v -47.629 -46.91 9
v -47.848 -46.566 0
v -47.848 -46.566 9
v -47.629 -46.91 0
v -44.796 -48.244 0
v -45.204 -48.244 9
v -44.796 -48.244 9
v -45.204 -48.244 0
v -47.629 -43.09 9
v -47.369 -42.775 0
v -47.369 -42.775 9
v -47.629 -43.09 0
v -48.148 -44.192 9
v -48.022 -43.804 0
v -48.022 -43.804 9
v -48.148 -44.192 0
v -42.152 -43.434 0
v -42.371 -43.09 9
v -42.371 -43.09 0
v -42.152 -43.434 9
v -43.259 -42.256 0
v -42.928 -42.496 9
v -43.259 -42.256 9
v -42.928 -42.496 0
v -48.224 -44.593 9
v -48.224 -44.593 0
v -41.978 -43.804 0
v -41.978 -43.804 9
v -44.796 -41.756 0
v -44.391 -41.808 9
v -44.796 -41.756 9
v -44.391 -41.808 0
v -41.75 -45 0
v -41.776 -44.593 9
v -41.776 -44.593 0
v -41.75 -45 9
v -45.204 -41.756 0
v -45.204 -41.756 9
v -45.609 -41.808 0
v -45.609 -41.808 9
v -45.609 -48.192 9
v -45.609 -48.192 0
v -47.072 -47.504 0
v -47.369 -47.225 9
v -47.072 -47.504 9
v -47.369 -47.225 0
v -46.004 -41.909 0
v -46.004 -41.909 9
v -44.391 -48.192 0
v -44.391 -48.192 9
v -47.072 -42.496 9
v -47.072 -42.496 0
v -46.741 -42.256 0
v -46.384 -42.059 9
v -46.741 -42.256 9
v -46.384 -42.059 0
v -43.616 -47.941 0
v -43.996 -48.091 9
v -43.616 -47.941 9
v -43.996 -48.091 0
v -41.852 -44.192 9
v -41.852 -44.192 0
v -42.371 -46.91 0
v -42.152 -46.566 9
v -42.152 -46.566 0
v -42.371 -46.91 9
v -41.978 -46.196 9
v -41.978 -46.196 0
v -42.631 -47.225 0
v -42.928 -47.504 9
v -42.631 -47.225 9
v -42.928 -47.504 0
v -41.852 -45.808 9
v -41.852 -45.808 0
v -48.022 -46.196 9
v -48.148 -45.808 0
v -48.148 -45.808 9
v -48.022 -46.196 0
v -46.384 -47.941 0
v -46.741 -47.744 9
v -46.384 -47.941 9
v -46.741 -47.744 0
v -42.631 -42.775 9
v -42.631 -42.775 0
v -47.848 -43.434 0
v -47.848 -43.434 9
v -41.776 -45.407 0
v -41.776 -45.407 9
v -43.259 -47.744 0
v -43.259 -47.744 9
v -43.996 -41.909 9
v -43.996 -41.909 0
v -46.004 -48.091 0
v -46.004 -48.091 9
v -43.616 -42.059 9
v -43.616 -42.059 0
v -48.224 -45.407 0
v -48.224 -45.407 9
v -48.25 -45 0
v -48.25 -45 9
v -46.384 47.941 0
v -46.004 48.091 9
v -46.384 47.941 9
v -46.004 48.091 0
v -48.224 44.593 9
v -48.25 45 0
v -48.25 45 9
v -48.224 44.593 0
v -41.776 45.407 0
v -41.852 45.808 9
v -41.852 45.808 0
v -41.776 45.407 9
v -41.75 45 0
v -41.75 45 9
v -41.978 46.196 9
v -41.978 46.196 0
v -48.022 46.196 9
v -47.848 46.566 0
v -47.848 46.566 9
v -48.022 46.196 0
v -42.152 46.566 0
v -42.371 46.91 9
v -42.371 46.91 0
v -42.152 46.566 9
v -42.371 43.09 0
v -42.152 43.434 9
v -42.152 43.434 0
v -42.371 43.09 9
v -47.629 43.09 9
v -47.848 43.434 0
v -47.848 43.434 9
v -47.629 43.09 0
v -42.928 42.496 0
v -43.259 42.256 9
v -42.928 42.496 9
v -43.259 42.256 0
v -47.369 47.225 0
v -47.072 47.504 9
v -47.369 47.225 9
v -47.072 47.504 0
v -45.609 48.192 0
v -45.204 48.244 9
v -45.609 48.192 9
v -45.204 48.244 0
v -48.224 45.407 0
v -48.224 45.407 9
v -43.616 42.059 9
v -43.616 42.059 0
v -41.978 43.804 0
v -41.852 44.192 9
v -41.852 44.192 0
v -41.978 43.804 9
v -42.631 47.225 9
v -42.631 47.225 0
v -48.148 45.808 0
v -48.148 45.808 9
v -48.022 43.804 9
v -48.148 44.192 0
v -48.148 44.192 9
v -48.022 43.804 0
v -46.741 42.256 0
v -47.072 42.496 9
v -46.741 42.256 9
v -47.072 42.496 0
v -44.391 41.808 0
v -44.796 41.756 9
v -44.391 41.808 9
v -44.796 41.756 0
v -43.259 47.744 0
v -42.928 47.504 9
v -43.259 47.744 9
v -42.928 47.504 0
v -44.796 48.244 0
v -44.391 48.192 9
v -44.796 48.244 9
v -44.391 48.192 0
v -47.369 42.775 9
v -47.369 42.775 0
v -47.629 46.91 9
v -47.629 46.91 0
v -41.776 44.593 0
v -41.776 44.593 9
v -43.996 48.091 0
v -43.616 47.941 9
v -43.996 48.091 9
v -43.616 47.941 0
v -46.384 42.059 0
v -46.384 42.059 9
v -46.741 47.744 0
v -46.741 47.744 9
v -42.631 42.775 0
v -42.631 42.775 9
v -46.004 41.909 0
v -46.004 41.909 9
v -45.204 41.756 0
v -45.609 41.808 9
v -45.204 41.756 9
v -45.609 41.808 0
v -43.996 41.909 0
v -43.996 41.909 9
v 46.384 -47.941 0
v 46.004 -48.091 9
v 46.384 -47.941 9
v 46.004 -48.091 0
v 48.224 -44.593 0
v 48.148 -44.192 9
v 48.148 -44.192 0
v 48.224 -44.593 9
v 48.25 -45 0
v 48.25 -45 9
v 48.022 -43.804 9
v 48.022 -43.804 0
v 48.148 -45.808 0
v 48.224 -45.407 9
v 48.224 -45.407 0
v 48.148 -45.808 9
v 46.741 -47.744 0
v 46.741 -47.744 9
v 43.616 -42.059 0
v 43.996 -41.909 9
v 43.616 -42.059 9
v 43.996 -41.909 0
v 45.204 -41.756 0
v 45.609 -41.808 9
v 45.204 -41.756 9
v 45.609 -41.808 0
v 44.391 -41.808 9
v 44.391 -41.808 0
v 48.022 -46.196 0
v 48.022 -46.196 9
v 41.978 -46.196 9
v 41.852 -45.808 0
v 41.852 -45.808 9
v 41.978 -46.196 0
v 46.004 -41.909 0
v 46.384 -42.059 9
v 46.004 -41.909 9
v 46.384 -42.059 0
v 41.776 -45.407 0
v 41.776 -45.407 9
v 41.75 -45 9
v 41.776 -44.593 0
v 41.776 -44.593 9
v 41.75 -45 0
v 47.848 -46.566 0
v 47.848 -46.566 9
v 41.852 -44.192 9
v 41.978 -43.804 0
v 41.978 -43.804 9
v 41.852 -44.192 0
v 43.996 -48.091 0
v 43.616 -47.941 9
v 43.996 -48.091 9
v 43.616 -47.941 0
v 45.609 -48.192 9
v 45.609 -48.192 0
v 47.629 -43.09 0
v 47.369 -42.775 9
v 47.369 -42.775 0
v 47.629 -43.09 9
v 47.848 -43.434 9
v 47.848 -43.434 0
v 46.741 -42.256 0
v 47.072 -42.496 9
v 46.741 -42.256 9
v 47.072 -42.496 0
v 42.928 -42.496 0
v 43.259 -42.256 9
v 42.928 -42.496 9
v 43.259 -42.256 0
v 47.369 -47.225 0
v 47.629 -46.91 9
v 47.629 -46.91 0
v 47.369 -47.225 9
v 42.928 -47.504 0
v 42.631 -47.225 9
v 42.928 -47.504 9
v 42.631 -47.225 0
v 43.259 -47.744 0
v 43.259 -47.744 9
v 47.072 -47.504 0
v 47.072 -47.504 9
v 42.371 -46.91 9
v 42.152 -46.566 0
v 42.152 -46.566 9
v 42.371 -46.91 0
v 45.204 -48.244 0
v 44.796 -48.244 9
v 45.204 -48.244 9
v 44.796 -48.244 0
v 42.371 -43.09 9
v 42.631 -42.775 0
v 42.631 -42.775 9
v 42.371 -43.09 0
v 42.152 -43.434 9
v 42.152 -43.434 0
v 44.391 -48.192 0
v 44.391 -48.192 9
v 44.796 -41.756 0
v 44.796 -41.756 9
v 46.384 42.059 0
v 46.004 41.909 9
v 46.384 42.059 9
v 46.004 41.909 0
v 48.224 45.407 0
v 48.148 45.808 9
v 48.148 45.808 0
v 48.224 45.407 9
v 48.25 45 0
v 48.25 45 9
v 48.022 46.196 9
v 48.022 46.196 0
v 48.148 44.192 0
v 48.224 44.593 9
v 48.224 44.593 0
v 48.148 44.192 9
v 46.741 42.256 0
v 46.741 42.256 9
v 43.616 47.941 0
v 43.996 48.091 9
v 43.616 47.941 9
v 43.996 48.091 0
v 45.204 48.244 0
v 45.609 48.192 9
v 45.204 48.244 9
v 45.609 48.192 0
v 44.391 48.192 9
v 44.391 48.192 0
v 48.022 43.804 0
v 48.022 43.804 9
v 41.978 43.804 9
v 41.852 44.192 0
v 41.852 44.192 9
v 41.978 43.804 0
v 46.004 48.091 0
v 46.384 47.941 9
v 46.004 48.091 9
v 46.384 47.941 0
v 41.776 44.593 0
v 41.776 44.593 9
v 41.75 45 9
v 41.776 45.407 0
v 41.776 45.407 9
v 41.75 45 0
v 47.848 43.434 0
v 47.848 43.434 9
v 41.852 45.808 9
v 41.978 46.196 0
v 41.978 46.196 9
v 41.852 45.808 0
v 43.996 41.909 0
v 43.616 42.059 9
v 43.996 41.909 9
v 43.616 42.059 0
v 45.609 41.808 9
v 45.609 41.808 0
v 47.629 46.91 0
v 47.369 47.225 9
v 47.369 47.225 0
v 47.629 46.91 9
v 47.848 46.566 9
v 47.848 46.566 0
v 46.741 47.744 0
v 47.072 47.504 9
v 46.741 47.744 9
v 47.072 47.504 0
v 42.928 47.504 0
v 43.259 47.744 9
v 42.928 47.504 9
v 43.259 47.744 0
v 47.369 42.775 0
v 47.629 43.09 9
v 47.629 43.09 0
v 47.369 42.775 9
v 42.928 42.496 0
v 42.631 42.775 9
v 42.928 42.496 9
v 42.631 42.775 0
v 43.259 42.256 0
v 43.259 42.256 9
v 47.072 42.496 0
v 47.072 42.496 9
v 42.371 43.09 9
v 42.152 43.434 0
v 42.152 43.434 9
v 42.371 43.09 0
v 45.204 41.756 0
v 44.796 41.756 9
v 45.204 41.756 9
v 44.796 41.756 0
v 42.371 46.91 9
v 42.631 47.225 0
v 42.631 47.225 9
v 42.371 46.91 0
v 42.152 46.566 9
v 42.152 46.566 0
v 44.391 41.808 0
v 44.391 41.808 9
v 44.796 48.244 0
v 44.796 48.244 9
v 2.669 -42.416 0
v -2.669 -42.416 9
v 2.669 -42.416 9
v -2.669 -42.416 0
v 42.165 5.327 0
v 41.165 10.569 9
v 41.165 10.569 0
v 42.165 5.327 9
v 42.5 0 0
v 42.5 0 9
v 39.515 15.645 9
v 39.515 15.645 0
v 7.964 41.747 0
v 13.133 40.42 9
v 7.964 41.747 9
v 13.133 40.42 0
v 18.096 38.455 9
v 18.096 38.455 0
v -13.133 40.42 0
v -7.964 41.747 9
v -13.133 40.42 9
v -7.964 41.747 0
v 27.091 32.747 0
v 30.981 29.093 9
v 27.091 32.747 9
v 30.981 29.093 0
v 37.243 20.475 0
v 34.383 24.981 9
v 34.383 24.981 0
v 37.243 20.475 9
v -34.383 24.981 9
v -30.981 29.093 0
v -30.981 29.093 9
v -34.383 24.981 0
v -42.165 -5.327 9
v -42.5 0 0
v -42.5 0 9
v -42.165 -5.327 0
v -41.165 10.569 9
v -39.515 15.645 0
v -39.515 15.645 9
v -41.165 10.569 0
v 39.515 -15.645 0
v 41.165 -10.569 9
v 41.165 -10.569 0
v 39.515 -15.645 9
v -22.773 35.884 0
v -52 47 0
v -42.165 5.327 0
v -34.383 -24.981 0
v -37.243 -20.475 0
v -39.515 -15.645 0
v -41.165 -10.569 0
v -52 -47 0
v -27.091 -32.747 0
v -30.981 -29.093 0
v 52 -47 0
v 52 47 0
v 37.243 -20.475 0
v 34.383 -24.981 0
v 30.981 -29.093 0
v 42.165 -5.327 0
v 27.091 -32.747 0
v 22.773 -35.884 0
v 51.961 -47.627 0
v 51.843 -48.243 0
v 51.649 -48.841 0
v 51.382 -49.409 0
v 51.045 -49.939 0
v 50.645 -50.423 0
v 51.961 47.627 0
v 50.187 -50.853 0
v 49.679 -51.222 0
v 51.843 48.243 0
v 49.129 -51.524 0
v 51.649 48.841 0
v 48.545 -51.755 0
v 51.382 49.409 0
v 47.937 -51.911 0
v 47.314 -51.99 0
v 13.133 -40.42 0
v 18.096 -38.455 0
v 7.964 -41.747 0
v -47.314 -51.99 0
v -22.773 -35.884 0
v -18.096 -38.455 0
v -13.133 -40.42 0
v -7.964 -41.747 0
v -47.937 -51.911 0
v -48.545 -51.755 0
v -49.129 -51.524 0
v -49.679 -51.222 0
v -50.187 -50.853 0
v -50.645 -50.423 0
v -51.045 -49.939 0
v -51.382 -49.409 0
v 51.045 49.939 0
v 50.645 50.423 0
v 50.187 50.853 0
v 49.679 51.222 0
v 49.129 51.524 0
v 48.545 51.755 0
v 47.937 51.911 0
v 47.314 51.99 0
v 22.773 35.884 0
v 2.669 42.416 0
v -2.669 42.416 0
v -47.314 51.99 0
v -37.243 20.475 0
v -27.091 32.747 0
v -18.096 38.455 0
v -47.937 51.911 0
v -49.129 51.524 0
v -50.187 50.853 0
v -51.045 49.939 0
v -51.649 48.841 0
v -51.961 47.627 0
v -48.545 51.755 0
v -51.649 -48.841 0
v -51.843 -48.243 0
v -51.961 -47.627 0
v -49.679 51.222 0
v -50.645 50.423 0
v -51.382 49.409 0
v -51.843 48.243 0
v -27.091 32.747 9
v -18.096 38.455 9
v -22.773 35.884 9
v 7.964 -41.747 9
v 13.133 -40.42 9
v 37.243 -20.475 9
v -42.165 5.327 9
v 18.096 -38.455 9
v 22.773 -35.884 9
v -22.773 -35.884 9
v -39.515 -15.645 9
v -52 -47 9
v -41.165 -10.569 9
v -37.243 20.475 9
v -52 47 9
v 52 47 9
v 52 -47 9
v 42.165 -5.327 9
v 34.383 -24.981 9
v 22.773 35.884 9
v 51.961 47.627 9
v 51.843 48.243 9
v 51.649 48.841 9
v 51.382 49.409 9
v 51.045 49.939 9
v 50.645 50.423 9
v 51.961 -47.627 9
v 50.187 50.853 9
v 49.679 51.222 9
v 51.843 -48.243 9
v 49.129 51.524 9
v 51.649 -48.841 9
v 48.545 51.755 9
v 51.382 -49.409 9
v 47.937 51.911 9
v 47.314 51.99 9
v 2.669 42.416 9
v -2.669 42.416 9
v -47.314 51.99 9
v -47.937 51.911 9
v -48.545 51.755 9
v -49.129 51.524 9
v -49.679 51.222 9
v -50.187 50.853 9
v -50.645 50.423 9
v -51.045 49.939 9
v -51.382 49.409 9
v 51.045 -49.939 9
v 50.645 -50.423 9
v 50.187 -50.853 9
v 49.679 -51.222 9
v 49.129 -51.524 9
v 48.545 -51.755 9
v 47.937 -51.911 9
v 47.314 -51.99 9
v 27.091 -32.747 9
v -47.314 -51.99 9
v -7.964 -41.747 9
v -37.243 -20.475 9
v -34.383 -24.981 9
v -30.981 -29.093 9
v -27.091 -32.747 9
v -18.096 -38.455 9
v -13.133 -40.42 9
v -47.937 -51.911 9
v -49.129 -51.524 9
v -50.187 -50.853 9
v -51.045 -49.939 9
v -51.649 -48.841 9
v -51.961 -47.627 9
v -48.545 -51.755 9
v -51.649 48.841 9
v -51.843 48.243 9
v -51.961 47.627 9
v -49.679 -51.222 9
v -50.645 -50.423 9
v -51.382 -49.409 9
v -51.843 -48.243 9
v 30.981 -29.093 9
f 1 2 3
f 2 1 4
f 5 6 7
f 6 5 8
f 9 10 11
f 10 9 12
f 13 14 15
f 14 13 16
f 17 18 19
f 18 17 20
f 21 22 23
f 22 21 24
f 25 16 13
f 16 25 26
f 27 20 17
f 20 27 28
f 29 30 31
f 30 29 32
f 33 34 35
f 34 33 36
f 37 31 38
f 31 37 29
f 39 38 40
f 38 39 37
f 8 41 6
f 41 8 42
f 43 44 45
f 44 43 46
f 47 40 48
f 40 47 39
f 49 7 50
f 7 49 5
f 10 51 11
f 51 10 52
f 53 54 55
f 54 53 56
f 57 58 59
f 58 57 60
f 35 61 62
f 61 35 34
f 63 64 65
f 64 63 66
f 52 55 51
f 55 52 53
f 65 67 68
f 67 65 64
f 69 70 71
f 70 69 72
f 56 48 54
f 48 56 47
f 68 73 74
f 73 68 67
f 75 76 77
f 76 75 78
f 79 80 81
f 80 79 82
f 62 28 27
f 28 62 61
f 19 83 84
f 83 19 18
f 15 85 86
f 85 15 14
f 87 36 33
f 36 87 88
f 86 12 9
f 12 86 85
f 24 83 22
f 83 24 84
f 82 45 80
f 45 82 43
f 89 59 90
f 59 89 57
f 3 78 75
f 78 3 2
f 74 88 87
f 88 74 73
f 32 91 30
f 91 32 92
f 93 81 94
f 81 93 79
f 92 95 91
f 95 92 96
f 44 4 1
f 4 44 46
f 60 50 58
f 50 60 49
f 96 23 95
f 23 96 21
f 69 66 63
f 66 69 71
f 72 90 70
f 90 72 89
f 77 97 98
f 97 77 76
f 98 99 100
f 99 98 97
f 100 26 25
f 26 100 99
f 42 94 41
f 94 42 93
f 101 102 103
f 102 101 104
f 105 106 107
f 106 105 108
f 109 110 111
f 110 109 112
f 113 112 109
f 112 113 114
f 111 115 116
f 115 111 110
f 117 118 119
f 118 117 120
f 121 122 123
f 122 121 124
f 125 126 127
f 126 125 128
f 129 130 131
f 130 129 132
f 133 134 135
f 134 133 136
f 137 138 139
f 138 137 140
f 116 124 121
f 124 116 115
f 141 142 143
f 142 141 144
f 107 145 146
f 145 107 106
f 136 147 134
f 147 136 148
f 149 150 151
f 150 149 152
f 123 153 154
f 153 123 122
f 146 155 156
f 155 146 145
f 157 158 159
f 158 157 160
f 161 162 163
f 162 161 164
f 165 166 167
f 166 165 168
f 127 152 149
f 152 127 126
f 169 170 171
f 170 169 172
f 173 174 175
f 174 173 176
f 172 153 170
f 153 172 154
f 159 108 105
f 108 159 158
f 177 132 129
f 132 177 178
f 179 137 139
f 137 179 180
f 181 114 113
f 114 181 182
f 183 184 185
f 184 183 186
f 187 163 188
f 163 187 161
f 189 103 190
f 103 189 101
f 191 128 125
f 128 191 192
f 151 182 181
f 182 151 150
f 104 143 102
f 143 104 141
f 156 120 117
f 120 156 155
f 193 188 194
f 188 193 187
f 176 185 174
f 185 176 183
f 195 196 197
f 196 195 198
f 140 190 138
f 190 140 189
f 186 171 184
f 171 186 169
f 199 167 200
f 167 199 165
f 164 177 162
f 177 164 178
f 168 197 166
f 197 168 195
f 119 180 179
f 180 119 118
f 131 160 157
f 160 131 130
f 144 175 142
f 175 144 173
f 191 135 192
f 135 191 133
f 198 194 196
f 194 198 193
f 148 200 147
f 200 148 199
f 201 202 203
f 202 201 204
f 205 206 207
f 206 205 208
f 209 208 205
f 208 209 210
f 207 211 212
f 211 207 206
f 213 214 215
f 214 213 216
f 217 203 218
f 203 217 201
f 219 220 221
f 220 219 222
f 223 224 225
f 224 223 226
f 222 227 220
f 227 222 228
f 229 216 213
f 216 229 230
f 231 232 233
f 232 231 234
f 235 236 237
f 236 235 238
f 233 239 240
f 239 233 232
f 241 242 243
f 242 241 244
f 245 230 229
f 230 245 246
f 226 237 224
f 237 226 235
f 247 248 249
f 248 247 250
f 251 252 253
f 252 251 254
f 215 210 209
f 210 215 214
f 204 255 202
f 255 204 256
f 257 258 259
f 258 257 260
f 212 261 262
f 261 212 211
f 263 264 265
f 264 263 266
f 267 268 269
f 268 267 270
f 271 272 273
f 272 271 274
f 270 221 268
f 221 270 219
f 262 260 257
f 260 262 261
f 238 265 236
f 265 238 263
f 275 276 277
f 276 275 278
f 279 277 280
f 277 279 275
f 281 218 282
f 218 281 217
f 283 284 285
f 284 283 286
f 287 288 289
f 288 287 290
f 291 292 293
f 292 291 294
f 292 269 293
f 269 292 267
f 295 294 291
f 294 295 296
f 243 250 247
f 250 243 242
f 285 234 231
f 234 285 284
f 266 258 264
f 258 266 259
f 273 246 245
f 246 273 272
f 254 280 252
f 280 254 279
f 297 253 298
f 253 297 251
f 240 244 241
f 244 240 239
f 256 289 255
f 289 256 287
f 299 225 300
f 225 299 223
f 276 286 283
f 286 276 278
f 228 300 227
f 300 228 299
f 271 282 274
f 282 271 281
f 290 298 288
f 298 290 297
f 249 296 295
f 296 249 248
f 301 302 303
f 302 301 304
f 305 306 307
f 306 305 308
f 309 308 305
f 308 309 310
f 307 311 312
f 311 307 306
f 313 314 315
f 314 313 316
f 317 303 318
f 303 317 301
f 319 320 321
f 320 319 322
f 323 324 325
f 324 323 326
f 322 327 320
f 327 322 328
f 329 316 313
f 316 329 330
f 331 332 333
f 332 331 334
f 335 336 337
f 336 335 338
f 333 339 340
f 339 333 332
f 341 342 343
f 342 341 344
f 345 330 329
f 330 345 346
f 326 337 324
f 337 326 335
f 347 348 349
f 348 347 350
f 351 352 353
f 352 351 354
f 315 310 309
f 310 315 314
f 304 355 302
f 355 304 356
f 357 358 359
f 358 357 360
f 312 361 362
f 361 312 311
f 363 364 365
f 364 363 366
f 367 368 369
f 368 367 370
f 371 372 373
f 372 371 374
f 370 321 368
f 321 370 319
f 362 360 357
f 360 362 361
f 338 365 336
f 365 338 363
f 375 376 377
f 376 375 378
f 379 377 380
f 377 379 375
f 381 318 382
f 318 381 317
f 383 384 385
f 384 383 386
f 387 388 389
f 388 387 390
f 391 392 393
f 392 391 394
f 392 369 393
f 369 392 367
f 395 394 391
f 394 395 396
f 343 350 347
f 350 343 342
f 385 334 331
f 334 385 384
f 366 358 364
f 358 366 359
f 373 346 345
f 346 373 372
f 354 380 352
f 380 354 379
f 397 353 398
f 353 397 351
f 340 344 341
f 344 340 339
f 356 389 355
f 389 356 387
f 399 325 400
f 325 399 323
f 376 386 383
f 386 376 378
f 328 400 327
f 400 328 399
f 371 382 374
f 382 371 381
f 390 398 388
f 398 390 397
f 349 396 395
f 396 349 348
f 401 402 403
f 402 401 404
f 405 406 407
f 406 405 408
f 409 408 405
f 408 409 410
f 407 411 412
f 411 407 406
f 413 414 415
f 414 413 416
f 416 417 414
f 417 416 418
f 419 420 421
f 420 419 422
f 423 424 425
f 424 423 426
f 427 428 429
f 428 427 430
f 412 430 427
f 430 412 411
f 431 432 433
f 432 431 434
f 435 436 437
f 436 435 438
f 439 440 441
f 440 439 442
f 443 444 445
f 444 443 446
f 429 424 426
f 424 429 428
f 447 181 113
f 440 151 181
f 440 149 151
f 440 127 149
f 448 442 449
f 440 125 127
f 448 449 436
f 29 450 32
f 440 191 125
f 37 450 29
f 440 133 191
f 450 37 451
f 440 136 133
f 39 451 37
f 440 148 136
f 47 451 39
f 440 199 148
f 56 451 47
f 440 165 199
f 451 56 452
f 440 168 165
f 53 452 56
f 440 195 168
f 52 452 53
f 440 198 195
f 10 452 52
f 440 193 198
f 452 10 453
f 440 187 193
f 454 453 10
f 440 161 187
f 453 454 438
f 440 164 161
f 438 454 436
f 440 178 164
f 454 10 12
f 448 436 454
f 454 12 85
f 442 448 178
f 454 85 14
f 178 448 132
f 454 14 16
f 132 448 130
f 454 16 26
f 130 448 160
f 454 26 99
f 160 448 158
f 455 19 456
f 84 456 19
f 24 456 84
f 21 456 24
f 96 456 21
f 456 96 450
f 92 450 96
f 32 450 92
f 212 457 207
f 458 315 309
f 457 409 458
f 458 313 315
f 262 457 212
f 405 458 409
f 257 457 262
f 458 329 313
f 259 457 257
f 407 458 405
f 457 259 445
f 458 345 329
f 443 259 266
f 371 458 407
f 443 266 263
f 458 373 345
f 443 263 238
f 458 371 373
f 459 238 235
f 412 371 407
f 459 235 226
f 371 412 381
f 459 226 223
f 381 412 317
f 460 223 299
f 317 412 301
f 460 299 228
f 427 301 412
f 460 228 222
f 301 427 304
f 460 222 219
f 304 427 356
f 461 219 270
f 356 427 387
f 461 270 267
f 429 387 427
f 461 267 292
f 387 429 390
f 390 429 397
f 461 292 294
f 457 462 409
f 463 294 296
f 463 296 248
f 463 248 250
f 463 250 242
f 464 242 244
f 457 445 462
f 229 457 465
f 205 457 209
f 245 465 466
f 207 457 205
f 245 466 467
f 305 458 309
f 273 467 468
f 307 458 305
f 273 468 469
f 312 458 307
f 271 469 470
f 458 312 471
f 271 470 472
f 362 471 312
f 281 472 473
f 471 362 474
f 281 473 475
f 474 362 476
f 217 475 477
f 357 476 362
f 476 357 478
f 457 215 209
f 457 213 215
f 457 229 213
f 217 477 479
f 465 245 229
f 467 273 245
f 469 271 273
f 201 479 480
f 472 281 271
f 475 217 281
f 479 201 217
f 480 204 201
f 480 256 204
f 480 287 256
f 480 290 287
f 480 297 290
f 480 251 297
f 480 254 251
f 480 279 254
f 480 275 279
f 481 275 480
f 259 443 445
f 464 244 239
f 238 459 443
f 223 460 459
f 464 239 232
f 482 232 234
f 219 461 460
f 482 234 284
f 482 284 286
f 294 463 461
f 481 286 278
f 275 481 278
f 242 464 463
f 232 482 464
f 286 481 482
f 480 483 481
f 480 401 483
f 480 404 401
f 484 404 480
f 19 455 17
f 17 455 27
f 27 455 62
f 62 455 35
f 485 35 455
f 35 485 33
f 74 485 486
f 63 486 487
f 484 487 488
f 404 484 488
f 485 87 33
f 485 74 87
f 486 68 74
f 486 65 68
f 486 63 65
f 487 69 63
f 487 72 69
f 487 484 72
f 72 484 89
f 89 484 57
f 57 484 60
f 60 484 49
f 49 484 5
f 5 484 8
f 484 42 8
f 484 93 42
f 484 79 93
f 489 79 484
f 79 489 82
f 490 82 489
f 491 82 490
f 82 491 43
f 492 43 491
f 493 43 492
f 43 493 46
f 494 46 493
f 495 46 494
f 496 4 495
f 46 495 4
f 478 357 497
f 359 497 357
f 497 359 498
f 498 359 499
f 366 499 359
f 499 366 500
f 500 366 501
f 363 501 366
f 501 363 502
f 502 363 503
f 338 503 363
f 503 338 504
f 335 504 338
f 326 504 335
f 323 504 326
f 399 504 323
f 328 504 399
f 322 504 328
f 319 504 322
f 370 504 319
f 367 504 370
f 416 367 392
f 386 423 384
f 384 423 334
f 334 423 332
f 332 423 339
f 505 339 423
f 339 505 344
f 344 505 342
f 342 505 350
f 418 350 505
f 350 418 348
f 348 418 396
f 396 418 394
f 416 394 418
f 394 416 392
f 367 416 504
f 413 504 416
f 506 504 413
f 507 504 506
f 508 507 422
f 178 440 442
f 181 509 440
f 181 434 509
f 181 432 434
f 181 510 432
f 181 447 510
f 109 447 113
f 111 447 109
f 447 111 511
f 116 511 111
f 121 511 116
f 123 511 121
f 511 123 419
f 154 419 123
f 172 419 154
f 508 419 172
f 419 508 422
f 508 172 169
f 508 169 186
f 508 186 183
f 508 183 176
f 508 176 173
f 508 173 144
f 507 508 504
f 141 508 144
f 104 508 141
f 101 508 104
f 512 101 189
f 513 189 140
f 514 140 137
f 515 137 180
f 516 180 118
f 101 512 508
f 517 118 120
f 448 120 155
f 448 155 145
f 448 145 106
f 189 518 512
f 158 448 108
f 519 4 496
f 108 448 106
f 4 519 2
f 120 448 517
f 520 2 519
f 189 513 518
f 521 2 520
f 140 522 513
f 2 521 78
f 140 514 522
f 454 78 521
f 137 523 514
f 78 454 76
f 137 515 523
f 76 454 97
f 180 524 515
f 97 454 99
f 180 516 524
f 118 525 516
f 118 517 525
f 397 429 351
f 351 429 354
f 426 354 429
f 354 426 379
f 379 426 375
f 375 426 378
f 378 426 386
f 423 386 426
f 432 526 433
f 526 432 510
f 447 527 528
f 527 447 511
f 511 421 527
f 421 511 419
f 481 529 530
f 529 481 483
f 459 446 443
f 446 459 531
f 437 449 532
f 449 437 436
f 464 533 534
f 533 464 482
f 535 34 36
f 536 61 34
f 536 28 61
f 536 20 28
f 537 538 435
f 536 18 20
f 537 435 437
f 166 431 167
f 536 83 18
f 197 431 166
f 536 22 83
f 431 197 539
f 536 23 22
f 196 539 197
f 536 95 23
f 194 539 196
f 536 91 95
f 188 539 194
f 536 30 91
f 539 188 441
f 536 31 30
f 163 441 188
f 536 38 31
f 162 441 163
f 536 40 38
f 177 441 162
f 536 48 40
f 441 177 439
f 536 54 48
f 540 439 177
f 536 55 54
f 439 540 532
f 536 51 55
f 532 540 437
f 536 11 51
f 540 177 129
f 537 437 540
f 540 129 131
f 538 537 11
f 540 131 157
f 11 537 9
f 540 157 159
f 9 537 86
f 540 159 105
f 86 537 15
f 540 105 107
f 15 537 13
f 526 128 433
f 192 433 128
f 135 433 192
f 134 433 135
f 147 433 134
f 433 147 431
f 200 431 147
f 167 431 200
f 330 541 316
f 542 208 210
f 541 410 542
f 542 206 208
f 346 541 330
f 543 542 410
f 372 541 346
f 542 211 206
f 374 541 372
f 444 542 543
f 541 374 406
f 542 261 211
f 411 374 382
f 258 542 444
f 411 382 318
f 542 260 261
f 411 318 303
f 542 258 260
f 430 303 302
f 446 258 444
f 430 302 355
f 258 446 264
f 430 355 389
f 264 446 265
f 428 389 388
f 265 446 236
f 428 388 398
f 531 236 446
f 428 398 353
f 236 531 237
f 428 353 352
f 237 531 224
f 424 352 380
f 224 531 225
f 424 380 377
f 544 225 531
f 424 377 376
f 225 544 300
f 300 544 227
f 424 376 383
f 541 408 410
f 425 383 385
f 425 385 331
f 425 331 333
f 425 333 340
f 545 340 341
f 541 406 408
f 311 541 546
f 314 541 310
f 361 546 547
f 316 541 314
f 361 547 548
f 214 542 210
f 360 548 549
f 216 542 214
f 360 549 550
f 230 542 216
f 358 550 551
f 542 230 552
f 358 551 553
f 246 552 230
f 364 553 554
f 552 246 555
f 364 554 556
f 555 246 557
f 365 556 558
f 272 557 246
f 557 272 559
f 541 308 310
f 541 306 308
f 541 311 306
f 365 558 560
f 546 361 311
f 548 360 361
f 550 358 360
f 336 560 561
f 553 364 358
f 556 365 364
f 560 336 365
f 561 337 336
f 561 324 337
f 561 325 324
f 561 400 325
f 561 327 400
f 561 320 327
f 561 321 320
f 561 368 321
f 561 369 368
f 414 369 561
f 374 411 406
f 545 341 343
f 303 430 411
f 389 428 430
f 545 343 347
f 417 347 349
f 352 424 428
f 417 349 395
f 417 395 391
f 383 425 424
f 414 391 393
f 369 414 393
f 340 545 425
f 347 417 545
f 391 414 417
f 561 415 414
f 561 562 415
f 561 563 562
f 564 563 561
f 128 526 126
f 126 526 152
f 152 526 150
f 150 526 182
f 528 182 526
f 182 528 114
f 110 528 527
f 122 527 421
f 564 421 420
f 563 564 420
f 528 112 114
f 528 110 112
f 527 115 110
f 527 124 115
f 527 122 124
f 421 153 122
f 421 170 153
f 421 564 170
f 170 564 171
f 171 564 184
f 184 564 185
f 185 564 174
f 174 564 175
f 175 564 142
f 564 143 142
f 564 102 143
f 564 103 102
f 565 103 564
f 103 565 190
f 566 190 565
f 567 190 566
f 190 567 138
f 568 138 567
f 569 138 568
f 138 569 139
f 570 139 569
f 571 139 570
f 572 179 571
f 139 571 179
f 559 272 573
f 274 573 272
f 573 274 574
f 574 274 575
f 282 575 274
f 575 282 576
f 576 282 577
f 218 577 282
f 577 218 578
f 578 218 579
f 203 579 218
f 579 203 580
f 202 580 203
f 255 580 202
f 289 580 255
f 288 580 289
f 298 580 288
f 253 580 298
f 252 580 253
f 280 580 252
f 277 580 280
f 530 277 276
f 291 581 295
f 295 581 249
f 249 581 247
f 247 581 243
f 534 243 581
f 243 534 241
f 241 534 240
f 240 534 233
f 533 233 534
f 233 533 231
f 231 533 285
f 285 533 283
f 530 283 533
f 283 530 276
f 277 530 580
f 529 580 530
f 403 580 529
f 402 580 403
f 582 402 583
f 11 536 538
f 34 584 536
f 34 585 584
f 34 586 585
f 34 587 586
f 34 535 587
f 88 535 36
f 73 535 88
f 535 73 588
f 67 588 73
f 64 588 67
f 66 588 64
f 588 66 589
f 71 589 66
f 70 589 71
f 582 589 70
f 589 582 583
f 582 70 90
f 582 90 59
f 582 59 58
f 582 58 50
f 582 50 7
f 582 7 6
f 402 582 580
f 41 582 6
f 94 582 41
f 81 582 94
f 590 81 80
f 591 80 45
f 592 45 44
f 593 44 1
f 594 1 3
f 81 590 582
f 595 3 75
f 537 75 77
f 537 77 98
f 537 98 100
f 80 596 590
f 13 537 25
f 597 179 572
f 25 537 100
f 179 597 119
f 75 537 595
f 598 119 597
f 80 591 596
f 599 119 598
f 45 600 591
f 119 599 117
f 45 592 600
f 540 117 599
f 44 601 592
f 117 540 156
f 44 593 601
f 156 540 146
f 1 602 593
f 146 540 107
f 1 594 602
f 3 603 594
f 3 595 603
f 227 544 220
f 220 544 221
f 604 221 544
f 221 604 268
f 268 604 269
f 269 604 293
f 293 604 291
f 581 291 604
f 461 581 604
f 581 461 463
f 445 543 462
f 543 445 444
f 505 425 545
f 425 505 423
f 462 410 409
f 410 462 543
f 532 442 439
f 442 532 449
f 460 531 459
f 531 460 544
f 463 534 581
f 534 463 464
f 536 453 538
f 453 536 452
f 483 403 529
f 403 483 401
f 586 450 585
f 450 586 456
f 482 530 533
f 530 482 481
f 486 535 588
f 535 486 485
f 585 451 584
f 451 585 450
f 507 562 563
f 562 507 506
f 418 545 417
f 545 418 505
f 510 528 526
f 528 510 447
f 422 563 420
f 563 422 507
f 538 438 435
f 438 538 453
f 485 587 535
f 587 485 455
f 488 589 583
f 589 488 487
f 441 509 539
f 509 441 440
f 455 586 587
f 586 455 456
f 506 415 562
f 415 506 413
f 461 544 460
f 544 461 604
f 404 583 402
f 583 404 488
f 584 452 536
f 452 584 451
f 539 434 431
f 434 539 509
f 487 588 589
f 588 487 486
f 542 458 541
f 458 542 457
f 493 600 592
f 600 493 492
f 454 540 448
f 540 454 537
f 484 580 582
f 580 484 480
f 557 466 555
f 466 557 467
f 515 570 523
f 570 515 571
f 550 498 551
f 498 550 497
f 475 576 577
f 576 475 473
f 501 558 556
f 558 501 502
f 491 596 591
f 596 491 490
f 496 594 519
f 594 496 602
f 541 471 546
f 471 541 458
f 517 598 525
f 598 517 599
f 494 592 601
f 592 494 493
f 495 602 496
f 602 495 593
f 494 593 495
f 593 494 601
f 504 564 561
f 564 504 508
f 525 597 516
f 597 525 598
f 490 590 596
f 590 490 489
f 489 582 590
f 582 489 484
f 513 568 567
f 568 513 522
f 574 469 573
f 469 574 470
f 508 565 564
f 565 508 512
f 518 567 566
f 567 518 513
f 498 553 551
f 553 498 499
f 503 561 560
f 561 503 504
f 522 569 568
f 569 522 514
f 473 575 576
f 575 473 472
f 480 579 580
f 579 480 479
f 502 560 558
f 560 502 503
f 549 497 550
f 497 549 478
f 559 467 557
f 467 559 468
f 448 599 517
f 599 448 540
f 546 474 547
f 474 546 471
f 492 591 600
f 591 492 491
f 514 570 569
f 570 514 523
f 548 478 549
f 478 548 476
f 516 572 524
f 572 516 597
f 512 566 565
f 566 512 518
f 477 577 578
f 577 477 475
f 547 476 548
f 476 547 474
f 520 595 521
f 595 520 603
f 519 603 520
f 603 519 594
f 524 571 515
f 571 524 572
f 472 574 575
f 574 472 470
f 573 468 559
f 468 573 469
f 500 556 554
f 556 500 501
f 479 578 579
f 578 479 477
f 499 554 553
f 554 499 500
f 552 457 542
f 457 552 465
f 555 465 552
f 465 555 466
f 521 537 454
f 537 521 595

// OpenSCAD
$fn = 50;


difference() {
	union() {
		hull() {
			translate(v = [-47.0000000000, 47.0000000000, 0]) {
				cylinder(h = 9, r = 5);
			}
			translate(v = [47.0000000000, 47.0000000000, 0]) {
				cylinder(h = 9, r = 5);
			}
			translate(v = [-47.0000000000, -47.0000000000, 0]) {
				cylinder(h = 9, r = 5);
			}
			translate(v = [47.0000000000, -47.0000000000, 0]) {
				cylinder(h = 9, r = 5);
			}
		}
	}
	union() {
		#translate(v = [-45.0000000000, -45.0000000000, -100.0000000000]) {
			cylinder(h = 200, r = 3.2500000000);
		}
		#translate(v = [-45.0000000000, 45.0000000000, -100.0000000000]) {
			cylinder(h = 200, r = 3.2500000000);
		}
		#translate(v = [45.0000000000, -45.0000000000, -100.0000000000]) {
			cylinder(h = 200, r = 3.2500000000);
		}
		#translate(v = [45.0000000000, 45.0000000000, -100.0000000000]) {
			cylinder(h = 200, r = 3.2500000000);
		}
		#cylinder(h = 9, r = 42.5000000000);
	}
}
